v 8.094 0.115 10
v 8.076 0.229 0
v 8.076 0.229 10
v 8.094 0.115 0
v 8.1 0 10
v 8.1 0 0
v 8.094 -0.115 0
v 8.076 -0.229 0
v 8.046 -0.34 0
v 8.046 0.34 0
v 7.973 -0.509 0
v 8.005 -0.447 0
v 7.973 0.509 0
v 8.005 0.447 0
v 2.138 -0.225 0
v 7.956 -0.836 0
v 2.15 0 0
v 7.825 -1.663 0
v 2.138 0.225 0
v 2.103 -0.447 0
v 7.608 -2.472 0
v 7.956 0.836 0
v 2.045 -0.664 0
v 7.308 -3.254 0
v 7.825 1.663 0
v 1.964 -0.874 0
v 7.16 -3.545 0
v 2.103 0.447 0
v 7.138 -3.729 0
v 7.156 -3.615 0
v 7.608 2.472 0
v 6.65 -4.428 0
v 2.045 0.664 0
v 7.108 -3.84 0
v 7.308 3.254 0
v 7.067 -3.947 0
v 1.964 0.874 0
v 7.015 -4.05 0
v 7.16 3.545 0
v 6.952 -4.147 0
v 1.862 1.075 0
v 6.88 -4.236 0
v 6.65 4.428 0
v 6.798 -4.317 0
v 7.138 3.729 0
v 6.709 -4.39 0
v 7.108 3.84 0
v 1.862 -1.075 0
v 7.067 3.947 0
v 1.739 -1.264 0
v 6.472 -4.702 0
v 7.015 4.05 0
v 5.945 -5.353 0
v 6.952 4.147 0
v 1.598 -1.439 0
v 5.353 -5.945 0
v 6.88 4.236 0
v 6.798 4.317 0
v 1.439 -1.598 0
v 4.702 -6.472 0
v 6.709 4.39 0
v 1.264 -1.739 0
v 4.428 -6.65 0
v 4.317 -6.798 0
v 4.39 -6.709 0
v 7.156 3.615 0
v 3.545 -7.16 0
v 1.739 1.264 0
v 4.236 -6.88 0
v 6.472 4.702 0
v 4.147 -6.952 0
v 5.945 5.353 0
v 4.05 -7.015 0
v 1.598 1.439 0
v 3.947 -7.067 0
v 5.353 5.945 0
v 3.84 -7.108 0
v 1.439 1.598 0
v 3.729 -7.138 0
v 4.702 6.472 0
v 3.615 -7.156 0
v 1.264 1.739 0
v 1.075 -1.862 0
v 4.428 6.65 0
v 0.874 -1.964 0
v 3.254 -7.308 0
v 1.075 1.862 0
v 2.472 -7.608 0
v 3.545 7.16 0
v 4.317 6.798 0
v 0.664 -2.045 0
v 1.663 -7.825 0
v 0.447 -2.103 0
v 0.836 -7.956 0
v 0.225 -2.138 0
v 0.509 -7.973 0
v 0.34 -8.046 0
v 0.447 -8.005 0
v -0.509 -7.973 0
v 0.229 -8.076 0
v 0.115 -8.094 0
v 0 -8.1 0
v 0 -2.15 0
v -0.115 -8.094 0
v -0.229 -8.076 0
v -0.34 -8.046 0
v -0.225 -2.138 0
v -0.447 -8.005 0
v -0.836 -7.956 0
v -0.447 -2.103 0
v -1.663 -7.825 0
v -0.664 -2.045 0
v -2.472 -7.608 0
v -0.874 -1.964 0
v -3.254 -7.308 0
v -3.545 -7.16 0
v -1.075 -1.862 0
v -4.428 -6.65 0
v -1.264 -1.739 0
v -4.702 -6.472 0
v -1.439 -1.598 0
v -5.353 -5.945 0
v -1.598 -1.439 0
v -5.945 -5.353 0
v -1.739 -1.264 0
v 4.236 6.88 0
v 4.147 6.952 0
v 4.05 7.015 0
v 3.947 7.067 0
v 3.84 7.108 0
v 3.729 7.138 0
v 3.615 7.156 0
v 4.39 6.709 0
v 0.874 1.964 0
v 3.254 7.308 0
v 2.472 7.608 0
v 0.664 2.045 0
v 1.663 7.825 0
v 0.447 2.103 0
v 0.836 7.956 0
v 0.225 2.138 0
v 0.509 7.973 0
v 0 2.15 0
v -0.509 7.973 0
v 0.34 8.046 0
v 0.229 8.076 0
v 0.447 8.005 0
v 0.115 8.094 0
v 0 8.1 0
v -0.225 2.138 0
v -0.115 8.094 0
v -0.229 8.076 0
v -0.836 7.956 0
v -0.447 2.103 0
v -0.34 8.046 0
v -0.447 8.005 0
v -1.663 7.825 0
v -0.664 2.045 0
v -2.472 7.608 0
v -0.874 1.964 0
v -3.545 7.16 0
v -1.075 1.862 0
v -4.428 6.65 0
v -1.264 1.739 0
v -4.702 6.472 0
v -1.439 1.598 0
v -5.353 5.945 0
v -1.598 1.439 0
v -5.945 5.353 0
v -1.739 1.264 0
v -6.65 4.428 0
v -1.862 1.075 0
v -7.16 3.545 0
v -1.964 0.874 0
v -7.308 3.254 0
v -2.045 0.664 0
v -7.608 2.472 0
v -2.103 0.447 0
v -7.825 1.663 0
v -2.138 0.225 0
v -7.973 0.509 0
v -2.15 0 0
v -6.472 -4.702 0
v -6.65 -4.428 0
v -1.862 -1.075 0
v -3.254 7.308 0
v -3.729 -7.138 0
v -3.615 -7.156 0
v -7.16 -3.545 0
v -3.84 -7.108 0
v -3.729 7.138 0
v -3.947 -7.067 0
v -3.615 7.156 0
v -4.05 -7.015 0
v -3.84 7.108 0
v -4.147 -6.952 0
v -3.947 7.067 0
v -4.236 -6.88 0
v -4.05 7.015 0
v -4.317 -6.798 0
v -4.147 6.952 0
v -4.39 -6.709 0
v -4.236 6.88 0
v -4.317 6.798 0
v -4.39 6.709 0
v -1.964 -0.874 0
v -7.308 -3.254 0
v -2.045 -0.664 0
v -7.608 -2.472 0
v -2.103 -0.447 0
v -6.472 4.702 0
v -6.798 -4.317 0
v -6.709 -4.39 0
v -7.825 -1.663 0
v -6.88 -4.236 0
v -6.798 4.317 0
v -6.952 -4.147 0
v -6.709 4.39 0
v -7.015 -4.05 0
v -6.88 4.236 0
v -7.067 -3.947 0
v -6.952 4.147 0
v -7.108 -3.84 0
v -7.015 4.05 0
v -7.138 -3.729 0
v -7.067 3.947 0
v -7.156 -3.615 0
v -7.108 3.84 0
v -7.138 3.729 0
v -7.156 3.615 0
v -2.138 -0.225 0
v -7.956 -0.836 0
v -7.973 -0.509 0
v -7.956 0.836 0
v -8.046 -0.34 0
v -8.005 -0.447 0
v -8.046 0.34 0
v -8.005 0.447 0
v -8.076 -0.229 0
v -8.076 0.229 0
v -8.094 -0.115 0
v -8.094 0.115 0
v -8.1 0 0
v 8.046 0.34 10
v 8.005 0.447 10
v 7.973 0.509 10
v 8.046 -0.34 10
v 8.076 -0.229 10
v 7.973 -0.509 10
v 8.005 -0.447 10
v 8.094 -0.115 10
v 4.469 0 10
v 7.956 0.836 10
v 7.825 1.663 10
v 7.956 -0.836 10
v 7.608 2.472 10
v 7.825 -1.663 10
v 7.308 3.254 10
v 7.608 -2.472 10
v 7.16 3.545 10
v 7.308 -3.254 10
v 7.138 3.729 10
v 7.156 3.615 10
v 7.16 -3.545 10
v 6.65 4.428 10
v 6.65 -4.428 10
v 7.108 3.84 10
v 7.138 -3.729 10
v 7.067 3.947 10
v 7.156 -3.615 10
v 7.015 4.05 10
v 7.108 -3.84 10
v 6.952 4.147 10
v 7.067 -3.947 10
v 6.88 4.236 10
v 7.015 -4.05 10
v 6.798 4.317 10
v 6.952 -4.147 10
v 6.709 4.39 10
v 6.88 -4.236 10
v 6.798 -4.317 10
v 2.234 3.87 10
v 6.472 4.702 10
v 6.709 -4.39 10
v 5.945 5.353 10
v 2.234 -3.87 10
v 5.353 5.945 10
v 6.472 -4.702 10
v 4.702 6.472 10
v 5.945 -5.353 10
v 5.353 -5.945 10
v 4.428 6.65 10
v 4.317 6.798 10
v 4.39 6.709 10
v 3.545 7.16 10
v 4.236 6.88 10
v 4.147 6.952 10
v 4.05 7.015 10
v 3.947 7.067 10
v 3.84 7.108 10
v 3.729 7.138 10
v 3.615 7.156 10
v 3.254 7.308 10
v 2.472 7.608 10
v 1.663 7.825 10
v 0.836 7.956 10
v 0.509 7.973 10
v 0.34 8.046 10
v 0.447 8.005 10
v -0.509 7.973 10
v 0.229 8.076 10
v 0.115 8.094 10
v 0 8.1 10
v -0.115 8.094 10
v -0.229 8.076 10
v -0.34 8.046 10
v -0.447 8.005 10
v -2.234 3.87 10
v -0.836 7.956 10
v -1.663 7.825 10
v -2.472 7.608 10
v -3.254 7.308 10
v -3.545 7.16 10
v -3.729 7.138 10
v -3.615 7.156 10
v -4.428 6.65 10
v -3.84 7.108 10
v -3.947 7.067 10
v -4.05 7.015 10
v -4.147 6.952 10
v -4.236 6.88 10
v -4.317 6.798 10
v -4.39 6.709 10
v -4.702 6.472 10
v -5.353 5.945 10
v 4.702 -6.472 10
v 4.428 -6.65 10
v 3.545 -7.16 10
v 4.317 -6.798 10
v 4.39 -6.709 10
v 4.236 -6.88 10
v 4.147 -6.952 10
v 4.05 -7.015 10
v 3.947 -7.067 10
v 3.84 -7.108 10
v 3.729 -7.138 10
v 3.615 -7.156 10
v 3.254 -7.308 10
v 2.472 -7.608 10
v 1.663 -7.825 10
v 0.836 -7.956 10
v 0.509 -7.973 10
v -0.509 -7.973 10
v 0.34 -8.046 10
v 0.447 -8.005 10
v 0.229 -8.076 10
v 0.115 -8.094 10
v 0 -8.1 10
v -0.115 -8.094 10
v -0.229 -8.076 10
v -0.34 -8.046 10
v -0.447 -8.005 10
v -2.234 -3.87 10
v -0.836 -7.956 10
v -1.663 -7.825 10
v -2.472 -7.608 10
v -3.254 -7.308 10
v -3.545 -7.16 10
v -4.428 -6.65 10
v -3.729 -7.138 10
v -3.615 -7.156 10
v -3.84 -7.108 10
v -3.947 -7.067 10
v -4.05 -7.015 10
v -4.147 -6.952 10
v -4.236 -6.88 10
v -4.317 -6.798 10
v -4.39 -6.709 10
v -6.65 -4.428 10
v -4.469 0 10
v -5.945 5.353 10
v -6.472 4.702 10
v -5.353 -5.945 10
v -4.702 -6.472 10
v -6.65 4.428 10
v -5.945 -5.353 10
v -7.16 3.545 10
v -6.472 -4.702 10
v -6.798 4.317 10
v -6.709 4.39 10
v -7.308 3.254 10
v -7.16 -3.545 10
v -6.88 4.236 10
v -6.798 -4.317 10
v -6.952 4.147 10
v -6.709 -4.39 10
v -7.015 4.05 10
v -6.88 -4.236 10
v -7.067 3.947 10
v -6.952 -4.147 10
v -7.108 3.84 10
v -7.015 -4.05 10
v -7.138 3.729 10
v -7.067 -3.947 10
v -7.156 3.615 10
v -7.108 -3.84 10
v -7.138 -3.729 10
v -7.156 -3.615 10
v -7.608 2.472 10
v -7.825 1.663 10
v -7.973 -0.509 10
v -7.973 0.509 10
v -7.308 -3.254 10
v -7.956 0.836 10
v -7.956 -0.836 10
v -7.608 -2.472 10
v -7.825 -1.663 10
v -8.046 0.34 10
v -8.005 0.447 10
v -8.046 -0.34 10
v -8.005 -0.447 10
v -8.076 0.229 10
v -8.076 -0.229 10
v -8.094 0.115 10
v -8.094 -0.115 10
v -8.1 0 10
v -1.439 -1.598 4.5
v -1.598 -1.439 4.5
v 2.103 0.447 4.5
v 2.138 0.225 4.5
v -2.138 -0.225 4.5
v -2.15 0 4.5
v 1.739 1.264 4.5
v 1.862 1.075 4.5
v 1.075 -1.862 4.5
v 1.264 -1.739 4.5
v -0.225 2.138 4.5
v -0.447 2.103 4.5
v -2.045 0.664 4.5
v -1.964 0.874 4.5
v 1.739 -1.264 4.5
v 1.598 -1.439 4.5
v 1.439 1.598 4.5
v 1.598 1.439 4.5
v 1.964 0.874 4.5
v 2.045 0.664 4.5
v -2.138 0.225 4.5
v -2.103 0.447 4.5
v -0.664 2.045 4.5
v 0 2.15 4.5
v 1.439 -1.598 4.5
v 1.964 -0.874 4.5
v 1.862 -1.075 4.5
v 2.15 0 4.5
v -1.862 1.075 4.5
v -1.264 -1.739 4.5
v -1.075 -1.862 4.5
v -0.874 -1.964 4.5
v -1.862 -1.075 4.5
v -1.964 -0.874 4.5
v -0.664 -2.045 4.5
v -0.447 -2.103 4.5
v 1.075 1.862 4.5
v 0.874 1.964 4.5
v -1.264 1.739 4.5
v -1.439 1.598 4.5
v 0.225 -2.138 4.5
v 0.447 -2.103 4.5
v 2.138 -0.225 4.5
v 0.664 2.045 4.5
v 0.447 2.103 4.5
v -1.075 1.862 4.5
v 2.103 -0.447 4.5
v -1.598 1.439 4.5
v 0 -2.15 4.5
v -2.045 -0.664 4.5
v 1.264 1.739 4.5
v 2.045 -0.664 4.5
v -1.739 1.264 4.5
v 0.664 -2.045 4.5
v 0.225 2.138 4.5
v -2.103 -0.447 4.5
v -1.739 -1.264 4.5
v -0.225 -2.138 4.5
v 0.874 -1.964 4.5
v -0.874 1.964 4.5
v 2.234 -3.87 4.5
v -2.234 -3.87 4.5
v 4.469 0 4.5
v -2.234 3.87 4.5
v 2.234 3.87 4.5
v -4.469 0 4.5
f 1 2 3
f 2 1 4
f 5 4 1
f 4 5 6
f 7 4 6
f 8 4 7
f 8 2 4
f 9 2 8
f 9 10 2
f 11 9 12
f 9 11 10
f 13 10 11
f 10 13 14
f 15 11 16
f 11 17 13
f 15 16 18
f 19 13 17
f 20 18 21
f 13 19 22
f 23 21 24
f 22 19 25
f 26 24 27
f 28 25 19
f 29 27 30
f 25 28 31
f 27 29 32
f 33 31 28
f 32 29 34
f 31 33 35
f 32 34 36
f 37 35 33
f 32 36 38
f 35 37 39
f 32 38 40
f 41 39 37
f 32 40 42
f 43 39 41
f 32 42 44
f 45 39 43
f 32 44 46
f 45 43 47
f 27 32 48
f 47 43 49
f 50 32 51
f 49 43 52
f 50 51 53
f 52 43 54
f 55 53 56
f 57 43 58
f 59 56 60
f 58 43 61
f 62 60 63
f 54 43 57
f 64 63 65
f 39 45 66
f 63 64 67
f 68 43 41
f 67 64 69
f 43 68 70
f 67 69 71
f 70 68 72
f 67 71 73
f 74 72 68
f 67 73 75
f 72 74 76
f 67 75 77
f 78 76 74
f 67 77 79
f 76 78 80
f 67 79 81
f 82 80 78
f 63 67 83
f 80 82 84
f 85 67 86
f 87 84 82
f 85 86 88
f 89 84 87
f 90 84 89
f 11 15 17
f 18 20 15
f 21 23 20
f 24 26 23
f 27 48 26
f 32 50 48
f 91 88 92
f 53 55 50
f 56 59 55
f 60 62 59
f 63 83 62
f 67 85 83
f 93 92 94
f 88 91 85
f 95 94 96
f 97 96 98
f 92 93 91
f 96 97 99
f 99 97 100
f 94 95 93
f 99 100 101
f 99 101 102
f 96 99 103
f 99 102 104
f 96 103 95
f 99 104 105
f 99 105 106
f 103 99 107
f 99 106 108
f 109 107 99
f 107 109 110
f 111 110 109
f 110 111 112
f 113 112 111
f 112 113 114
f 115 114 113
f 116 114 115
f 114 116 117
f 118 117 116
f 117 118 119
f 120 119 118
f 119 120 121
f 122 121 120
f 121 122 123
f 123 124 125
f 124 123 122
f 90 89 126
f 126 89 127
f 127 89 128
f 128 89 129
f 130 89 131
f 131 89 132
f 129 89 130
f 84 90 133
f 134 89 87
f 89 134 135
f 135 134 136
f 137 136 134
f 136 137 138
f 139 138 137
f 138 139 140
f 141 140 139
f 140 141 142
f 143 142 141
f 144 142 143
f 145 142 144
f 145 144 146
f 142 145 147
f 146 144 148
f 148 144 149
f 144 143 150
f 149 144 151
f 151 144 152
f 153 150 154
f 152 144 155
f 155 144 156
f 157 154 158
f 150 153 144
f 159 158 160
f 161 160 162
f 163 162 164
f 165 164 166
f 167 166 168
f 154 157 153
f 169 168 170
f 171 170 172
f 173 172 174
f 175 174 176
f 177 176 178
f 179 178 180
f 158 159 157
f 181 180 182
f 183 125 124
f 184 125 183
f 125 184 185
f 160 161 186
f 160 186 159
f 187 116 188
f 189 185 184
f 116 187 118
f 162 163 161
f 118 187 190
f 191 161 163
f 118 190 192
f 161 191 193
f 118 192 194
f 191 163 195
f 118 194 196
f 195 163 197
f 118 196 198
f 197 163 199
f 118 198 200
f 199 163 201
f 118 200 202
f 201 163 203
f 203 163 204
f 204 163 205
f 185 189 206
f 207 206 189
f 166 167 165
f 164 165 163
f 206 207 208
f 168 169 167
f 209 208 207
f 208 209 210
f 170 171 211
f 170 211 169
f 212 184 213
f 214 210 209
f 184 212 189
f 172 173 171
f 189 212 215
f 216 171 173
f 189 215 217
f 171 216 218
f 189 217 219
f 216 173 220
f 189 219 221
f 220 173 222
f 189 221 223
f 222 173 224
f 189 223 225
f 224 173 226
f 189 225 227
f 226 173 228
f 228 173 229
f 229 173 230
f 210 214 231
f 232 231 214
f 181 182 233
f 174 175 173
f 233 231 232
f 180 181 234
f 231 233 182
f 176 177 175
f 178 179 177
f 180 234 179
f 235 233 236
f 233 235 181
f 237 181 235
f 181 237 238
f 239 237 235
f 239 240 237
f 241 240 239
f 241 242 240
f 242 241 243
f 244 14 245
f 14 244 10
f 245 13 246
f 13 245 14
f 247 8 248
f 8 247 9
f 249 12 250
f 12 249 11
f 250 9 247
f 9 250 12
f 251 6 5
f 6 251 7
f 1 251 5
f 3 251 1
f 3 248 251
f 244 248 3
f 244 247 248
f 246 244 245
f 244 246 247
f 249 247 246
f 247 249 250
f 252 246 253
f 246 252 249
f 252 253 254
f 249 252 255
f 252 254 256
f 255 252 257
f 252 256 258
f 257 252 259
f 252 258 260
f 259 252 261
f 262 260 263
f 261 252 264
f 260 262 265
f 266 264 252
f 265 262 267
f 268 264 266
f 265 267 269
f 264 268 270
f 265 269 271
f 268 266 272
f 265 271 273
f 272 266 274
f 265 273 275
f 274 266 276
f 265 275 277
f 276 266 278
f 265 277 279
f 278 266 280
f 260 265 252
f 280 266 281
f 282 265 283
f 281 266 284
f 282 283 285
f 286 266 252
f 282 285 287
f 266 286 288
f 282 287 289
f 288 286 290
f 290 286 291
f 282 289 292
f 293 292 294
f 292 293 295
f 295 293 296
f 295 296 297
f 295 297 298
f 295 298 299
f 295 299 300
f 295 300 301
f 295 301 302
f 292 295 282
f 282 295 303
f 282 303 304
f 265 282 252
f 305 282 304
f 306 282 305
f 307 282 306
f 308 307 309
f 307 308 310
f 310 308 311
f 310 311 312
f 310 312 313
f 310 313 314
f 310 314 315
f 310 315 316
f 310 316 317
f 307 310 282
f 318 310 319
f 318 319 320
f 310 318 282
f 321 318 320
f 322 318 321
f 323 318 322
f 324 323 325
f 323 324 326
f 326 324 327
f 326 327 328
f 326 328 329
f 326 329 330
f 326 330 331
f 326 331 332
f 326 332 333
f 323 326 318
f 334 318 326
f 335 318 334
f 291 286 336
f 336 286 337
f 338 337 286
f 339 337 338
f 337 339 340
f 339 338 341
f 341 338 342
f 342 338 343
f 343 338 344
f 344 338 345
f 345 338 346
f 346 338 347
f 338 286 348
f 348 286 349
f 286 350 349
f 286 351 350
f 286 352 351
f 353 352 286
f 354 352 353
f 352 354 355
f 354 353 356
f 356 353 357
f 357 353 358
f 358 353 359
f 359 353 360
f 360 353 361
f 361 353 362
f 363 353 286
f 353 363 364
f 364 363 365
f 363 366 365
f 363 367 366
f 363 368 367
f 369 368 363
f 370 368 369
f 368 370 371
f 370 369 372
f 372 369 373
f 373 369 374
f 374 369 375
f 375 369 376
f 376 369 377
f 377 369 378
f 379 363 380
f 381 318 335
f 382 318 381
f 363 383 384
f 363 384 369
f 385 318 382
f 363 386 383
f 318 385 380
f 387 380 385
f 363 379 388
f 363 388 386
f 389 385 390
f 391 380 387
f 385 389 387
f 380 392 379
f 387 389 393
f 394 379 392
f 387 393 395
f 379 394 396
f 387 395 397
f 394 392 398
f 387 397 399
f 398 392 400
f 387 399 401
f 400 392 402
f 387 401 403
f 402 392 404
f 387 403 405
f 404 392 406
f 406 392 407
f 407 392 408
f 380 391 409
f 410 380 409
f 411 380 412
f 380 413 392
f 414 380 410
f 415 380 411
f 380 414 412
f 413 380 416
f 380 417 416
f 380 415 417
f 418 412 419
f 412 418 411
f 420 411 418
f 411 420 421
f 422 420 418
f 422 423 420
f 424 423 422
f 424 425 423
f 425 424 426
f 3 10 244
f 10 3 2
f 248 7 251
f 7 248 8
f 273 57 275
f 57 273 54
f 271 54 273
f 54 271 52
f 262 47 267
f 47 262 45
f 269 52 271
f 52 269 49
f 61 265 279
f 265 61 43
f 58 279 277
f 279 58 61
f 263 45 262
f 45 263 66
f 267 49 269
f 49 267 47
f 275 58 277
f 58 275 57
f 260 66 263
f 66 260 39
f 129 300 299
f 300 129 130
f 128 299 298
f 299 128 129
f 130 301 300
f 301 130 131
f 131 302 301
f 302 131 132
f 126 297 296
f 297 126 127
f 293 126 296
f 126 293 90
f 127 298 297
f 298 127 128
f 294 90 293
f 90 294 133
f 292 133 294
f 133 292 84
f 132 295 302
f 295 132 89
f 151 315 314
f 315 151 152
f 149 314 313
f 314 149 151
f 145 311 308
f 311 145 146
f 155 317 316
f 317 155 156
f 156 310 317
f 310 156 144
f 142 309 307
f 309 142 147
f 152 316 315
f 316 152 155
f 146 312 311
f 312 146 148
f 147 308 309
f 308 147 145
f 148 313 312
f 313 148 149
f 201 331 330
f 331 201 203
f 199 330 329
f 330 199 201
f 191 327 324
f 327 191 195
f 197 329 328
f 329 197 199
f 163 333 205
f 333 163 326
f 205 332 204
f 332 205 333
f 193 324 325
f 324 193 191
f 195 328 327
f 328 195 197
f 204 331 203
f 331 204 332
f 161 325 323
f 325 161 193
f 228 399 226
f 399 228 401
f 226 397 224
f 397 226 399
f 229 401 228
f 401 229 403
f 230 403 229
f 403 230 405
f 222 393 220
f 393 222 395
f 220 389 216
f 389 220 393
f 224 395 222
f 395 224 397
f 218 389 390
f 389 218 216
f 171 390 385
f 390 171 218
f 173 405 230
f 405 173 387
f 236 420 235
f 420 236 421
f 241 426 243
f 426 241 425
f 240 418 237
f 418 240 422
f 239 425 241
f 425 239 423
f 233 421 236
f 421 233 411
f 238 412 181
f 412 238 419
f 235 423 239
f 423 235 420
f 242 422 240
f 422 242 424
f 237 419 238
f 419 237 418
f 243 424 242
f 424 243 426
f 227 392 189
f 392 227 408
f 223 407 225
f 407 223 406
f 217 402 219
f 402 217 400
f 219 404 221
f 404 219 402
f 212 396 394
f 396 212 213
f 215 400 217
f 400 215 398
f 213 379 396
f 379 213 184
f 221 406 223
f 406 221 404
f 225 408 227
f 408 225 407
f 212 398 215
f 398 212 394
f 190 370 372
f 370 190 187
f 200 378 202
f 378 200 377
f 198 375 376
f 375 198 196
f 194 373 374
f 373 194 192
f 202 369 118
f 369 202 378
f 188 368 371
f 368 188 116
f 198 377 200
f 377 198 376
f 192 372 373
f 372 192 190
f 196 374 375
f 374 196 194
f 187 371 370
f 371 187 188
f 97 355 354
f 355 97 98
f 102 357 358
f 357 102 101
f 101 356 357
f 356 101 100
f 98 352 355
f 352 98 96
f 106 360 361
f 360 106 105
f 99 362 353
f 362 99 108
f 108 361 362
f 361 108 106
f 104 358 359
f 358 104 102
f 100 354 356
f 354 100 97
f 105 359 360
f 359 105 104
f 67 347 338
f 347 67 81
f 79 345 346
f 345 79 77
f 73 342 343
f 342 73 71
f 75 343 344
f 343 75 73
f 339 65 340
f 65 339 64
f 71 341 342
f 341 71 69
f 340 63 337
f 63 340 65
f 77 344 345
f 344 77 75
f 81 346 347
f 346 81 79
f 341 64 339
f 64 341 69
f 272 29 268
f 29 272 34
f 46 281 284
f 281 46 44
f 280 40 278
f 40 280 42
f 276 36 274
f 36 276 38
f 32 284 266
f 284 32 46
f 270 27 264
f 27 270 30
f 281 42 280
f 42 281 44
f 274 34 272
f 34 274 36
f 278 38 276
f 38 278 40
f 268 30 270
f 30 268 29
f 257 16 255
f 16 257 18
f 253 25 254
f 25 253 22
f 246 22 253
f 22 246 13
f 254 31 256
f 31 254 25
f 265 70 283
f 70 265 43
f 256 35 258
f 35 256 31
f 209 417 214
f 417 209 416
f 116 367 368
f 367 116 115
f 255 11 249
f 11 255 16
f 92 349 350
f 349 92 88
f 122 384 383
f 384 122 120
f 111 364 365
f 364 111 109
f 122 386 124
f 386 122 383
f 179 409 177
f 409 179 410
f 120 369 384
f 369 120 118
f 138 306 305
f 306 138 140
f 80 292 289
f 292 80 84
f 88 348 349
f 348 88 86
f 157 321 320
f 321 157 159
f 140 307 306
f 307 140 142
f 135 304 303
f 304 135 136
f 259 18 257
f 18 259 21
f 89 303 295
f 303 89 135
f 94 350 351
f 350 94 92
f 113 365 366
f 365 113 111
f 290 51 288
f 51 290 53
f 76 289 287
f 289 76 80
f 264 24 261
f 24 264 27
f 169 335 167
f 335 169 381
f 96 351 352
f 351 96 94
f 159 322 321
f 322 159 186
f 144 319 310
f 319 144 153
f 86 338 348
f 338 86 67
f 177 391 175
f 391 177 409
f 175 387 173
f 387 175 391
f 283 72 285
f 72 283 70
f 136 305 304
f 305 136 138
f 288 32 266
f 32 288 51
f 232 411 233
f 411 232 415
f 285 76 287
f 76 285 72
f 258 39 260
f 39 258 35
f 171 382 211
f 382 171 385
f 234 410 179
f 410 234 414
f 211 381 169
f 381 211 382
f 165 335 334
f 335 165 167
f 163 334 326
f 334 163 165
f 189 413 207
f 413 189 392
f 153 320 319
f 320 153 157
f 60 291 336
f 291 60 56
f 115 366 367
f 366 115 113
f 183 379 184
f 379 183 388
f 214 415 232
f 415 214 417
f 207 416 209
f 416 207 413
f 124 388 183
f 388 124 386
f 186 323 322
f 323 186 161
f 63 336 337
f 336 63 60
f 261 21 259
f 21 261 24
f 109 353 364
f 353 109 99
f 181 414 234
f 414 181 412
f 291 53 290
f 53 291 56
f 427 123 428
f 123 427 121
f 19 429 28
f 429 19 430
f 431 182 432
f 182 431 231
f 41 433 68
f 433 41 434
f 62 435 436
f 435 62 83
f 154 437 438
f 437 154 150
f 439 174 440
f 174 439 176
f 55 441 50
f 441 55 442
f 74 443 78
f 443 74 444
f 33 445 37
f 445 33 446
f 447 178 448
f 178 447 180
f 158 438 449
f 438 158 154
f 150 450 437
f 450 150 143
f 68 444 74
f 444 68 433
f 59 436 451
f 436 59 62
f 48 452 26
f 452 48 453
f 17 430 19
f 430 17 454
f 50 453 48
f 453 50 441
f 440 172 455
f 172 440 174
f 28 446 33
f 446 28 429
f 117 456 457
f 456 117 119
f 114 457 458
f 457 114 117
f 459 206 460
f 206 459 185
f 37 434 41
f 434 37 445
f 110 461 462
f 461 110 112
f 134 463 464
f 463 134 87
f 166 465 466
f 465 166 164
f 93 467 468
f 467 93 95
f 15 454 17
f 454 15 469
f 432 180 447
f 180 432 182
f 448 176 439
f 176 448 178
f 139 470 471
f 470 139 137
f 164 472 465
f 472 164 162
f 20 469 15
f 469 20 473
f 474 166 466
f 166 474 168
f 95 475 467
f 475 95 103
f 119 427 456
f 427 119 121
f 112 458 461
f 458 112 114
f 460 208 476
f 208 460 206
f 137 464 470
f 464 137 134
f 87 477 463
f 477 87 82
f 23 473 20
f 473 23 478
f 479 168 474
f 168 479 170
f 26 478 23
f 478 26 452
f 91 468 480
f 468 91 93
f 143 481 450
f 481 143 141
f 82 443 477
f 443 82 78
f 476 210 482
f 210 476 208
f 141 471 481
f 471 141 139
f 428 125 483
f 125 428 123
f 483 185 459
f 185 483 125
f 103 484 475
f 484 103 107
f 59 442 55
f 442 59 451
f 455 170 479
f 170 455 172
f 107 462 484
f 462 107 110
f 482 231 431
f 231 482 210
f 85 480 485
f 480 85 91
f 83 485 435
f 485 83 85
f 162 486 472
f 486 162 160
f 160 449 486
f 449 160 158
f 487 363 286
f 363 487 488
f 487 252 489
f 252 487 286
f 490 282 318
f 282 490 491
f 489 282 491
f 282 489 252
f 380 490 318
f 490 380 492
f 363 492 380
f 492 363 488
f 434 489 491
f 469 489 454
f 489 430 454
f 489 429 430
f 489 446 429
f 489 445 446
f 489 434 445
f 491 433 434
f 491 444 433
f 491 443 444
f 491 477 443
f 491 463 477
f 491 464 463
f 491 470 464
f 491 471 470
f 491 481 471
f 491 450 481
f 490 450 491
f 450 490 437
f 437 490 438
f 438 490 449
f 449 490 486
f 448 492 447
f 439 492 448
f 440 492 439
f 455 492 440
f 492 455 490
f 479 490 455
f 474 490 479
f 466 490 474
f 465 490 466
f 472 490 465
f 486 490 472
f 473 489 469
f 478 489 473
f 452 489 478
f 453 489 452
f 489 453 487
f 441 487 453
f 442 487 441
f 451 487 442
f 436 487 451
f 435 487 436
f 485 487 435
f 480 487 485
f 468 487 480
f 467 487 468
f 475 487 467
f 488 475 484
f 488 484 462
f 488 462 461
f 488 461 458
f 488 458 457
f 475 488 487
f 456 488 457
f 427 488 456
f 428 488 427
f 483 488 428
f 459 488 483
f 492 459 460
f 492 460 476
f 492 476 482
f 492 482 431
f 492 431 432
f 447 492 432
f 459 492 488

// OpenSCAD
// Knurled-style thumb knob with hex socket.
$fn = 60;
eps = 0.02;
thread_d = 4.3;
knob_d = 16;
knob_h = 10;
socket_flat = thread_d * 1.8;
difference() {
    union() {
        cylinder(d = knob_d, h = knob_h);
        for (i = [0 : 11]) rotate([0, 0, i * 30]) translate([knob_d / 2 - 1, 0, 0]) cylinder(d = 2.2, h = knob_h);
    }
    translate([0, 0, -eps]) cylinder(d = thread_d, h = knob_h + 2 * eps);
    translate([0, 0, knob_h - knob_h * 0.55]) cylinder(d = socket_flat / cos(30), h = knob_h * 0.55 + eps, $fn = 6);
}
